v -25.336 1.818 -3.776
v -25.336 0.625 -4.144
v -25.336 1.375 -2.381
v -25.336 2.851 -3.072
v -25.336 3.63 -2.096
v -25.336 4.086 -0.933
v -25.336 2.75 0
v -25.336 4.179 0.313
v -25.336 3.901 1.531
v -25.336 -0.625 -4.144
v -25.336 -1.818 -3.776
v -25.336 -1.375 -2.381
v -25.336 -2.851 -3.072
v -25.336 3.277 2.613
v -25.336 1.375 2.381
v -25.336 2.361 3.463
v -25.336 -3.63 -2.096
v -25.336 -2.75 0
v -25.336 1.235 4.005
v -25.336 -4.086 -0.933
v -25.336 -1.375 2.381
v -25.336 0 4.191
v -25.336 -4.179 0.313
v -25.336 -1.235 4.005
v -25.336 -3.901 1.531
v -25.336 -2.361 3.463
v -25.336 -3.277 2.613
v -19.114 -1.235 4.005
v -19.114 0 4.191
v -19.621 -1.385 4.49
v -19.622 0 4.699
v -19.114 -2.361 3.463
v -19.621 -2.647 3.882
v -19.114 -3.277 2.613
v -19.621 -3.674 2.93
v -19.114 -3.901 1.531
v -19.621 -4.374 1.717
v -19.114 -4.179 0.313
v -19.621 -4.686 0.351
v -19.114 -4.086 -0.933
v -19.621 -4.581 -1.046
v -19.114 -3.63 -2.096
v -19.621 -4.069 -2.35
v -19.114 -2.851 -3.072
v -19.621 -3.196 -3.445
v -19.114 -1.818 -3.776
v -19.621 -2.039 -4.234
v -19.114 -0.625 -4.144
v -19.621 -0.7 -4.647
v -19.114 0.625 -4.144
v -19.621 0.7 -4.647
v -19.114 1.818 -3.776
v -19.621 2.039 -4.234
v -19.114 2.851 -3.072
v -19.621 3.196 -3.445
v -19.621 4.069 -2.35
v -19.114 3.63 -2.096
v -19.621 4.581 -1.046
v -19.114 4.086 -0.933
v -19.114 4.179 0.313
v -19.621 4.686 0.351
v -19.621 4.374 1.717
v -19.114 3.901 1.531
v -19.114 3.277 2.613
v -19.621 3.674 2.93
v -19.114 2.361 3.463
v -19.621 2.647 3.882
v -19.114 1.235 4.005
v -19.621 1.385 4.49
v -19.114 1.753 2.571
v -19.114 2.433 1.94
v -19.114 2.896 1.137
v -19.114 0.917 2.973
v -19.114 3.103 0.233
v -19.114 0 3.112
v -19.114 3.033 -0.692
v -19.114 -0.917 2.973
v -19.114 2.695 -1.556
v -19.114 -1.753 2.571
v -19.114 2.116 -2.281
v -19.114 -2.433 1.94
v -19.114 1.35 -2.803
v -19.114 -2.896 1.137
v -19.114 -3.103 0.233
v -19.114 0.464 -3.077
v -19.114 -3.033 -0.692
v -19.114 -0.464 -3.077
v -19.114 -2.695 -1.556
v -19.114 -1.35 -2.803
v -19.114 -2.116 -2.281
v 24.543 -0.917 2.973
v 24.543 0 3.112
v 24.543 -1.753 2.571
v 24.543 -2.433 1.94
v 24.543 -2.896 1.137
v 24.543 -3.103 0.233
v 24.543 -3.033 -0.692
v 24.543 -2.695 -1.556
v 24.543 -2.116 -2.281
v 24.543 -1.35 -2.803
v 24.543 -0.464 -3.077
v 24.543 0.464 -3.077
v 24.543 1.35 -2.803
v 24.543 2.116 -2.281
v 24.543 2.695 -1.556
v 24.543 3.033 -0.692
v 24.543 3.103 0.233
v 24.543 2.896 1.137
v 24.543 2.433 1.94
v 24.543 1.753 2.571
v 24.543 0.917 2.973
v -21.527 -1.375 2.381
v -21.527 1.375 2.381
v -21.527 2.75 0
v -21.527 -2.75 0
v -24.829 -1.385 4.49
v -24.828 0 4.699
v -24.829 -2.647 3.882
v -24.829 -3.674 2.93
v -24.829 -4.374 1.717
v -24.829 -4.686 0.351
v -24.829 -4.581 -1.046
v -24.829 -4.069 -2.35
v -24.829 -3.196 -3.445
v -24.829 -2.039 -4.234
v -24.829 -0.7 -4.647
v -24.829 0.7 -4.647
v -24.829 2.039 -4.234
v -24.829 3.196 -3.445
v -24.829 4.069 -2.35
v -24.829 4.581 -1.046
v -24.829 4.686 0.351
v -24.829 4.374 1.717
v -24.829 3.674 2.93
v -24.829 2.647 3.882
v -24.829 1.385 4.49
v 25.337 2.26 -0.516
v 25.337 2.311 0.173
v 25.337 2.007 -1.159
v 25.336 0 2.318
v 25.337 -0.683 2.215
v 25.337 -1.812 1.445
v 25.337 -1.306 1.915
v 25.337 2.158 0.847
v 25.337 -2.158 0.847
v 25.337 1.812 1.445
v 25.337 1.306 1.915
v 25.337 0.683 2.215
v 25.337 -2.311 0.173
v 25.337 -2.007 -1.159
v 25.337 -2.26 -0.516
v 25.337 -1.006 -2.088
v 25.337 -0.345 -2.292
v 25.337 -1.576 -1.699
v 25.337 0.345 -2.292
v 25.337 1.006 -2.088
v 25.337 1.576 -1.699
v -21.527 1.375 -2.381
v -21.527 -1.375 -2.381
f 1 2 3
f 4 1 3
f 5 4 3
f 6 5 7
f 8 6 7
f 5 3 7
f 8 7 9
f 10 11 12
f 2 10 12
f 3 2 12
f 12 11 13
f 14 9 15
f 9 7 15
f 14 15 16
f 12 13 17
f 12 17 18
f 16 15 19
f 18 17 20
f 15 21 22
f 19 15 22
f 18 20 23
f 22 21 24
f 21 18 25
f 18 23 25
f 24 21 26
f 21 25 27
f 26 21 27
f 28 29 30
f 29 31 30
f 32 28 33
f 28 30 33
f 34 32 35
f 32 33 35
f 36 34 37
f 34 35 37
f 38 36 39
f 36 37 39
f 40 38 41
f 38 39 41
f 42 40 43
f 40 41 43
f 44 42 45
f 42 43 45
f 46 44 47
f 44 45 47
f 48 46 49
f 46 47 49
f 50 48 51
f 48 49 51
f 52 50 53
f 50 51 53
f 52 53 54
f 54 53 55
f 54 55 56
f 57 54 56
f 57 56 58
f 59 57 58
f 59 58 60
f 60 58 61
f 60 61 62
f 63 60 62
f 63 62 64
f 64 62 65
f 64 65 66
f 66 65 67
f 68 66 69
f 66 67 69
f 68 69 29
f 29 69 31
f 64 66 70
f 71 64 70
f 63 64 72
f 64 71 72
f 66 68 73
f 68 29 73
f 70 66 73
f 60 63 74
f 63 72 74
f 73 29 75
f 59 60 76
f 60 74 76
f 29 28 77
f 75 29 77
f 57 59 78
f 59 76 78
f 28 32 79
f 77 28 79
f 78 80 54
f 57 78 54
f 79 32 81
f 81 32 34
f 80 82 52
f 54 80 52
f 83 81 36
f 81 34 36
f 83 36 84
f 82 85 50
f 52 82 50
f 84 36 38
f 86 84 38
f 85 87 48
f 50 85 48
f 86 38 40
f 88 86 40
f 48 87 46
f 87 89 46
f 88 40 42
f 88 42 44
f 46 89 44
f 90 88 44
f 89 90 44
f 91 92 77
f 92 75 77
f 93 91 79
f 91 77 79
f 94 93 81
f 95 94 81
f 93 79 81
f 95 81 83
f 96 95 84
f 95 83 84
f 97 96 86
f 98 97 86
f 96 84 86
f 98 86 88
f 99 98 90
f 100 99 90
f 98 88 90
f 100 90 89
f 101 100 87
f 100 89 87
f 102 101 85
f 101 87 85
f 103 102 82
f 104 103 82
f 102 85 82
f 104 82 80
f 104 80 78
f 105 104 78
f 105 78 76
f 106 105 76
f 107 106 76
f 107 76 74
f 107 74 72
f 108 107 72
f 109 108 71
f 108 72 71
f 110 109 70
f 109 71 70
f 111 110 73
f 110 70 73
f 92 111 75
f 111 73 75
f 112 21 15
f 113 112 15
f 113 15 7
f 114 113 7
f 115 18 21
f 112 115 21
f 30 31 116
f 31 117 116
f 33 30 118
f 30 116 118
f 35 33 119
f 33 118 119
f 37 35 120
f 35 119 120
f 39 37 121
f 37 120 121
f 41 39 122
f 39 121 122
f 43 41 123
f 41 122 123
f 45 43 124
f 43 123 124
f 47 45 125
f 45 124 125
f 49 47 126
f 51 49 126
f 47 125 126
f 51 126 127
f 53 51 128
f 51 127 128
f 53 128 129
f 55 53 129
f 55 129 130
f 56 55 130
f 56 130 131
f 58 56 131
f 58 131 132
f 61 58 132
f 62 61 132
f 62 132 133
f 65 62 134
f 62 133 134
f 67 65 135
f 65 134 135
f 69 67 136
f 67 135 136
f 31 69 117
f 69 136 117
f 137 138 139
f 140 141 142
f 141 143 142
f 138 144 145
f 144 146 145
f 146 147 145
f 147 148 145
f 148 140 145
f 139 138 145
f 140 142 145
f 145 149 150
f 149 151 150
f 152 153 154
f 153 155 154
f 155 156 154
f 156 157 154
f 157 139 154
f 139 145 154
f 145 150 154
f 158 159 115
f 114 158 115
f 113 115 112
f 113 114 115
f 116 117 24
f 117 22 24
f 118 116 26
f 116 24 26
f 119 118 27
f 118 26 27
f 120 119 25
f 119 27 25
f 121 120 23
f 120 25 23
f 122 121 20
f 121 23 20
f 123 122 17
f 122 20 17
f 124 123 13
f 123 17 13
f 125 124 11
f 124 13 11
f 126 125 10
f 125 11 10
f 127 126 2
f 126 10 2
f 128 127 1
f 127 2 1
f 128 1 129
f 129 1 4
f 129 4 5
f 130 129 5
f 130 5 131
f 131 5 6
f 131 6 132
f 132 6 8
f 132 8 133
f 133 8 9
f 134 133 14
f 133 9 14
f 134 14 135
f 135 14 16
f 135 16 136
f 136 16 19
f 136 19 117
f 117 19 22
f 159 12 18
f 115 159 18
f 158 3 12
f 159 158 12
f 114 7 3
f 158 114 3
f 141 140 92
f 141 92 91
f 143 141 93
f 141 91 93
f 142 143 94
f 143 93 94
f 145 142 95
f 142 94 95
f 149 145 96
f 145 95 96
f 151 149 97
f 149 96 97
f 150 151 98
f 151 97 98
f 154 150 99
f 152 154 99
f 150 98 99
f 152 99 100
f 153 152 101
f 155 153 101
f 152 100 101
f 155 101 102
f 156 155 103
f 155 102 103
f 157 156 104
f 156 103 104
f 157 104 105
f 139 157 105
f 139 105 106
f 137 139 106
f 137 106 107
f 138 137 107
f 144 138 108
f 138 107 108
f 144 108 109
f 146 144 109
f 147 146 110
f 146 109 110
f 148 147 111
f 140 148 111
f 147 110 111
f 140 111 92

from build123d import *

# Parameters (mm, degrees)
EXTRUDE1_DEPTH = 3.81


with BuildPart() as part:
    # Sketch1 → Revolve1 (revolve)
    with BuildSketch(Plane.XY, mode=Mode.PRIVATE) as revolve1_sk:
        Polygon((25.3365, 0), (25.3365, 2.31775), (24.54275, 3.1115), (-19.1135, 3.1115), (-19.1135, 4.191), (-19.6215, 4.699), (-24.8285, 4.699), (-25.3365, 4.191), (-25.3365, 0), align=None)
    revolve(revolve1_sk.sketch.rotate(Axis((-124.874669814, 0, 0), (1, 0, 0)), 90), axis=Axis((-124.874669814, 0, 0), (1, 0, 0)))

    # Sketch2 → Extrude1 (cut)
    with BuildSketch(Plane.ZY.offset(25.3365)):
        Polygon((0, 2.749630657), (-2.38125, 1.374815329), (-2.38125, -1.374815329), (0, -2.749630657), (2.38125, -1.374815329), (2.38125, 1.374815329), align=None)
    extrude(amount=-EXTRUDE1_DEPTH, mode=Mode.SUBTRACT)


solid = part.part
